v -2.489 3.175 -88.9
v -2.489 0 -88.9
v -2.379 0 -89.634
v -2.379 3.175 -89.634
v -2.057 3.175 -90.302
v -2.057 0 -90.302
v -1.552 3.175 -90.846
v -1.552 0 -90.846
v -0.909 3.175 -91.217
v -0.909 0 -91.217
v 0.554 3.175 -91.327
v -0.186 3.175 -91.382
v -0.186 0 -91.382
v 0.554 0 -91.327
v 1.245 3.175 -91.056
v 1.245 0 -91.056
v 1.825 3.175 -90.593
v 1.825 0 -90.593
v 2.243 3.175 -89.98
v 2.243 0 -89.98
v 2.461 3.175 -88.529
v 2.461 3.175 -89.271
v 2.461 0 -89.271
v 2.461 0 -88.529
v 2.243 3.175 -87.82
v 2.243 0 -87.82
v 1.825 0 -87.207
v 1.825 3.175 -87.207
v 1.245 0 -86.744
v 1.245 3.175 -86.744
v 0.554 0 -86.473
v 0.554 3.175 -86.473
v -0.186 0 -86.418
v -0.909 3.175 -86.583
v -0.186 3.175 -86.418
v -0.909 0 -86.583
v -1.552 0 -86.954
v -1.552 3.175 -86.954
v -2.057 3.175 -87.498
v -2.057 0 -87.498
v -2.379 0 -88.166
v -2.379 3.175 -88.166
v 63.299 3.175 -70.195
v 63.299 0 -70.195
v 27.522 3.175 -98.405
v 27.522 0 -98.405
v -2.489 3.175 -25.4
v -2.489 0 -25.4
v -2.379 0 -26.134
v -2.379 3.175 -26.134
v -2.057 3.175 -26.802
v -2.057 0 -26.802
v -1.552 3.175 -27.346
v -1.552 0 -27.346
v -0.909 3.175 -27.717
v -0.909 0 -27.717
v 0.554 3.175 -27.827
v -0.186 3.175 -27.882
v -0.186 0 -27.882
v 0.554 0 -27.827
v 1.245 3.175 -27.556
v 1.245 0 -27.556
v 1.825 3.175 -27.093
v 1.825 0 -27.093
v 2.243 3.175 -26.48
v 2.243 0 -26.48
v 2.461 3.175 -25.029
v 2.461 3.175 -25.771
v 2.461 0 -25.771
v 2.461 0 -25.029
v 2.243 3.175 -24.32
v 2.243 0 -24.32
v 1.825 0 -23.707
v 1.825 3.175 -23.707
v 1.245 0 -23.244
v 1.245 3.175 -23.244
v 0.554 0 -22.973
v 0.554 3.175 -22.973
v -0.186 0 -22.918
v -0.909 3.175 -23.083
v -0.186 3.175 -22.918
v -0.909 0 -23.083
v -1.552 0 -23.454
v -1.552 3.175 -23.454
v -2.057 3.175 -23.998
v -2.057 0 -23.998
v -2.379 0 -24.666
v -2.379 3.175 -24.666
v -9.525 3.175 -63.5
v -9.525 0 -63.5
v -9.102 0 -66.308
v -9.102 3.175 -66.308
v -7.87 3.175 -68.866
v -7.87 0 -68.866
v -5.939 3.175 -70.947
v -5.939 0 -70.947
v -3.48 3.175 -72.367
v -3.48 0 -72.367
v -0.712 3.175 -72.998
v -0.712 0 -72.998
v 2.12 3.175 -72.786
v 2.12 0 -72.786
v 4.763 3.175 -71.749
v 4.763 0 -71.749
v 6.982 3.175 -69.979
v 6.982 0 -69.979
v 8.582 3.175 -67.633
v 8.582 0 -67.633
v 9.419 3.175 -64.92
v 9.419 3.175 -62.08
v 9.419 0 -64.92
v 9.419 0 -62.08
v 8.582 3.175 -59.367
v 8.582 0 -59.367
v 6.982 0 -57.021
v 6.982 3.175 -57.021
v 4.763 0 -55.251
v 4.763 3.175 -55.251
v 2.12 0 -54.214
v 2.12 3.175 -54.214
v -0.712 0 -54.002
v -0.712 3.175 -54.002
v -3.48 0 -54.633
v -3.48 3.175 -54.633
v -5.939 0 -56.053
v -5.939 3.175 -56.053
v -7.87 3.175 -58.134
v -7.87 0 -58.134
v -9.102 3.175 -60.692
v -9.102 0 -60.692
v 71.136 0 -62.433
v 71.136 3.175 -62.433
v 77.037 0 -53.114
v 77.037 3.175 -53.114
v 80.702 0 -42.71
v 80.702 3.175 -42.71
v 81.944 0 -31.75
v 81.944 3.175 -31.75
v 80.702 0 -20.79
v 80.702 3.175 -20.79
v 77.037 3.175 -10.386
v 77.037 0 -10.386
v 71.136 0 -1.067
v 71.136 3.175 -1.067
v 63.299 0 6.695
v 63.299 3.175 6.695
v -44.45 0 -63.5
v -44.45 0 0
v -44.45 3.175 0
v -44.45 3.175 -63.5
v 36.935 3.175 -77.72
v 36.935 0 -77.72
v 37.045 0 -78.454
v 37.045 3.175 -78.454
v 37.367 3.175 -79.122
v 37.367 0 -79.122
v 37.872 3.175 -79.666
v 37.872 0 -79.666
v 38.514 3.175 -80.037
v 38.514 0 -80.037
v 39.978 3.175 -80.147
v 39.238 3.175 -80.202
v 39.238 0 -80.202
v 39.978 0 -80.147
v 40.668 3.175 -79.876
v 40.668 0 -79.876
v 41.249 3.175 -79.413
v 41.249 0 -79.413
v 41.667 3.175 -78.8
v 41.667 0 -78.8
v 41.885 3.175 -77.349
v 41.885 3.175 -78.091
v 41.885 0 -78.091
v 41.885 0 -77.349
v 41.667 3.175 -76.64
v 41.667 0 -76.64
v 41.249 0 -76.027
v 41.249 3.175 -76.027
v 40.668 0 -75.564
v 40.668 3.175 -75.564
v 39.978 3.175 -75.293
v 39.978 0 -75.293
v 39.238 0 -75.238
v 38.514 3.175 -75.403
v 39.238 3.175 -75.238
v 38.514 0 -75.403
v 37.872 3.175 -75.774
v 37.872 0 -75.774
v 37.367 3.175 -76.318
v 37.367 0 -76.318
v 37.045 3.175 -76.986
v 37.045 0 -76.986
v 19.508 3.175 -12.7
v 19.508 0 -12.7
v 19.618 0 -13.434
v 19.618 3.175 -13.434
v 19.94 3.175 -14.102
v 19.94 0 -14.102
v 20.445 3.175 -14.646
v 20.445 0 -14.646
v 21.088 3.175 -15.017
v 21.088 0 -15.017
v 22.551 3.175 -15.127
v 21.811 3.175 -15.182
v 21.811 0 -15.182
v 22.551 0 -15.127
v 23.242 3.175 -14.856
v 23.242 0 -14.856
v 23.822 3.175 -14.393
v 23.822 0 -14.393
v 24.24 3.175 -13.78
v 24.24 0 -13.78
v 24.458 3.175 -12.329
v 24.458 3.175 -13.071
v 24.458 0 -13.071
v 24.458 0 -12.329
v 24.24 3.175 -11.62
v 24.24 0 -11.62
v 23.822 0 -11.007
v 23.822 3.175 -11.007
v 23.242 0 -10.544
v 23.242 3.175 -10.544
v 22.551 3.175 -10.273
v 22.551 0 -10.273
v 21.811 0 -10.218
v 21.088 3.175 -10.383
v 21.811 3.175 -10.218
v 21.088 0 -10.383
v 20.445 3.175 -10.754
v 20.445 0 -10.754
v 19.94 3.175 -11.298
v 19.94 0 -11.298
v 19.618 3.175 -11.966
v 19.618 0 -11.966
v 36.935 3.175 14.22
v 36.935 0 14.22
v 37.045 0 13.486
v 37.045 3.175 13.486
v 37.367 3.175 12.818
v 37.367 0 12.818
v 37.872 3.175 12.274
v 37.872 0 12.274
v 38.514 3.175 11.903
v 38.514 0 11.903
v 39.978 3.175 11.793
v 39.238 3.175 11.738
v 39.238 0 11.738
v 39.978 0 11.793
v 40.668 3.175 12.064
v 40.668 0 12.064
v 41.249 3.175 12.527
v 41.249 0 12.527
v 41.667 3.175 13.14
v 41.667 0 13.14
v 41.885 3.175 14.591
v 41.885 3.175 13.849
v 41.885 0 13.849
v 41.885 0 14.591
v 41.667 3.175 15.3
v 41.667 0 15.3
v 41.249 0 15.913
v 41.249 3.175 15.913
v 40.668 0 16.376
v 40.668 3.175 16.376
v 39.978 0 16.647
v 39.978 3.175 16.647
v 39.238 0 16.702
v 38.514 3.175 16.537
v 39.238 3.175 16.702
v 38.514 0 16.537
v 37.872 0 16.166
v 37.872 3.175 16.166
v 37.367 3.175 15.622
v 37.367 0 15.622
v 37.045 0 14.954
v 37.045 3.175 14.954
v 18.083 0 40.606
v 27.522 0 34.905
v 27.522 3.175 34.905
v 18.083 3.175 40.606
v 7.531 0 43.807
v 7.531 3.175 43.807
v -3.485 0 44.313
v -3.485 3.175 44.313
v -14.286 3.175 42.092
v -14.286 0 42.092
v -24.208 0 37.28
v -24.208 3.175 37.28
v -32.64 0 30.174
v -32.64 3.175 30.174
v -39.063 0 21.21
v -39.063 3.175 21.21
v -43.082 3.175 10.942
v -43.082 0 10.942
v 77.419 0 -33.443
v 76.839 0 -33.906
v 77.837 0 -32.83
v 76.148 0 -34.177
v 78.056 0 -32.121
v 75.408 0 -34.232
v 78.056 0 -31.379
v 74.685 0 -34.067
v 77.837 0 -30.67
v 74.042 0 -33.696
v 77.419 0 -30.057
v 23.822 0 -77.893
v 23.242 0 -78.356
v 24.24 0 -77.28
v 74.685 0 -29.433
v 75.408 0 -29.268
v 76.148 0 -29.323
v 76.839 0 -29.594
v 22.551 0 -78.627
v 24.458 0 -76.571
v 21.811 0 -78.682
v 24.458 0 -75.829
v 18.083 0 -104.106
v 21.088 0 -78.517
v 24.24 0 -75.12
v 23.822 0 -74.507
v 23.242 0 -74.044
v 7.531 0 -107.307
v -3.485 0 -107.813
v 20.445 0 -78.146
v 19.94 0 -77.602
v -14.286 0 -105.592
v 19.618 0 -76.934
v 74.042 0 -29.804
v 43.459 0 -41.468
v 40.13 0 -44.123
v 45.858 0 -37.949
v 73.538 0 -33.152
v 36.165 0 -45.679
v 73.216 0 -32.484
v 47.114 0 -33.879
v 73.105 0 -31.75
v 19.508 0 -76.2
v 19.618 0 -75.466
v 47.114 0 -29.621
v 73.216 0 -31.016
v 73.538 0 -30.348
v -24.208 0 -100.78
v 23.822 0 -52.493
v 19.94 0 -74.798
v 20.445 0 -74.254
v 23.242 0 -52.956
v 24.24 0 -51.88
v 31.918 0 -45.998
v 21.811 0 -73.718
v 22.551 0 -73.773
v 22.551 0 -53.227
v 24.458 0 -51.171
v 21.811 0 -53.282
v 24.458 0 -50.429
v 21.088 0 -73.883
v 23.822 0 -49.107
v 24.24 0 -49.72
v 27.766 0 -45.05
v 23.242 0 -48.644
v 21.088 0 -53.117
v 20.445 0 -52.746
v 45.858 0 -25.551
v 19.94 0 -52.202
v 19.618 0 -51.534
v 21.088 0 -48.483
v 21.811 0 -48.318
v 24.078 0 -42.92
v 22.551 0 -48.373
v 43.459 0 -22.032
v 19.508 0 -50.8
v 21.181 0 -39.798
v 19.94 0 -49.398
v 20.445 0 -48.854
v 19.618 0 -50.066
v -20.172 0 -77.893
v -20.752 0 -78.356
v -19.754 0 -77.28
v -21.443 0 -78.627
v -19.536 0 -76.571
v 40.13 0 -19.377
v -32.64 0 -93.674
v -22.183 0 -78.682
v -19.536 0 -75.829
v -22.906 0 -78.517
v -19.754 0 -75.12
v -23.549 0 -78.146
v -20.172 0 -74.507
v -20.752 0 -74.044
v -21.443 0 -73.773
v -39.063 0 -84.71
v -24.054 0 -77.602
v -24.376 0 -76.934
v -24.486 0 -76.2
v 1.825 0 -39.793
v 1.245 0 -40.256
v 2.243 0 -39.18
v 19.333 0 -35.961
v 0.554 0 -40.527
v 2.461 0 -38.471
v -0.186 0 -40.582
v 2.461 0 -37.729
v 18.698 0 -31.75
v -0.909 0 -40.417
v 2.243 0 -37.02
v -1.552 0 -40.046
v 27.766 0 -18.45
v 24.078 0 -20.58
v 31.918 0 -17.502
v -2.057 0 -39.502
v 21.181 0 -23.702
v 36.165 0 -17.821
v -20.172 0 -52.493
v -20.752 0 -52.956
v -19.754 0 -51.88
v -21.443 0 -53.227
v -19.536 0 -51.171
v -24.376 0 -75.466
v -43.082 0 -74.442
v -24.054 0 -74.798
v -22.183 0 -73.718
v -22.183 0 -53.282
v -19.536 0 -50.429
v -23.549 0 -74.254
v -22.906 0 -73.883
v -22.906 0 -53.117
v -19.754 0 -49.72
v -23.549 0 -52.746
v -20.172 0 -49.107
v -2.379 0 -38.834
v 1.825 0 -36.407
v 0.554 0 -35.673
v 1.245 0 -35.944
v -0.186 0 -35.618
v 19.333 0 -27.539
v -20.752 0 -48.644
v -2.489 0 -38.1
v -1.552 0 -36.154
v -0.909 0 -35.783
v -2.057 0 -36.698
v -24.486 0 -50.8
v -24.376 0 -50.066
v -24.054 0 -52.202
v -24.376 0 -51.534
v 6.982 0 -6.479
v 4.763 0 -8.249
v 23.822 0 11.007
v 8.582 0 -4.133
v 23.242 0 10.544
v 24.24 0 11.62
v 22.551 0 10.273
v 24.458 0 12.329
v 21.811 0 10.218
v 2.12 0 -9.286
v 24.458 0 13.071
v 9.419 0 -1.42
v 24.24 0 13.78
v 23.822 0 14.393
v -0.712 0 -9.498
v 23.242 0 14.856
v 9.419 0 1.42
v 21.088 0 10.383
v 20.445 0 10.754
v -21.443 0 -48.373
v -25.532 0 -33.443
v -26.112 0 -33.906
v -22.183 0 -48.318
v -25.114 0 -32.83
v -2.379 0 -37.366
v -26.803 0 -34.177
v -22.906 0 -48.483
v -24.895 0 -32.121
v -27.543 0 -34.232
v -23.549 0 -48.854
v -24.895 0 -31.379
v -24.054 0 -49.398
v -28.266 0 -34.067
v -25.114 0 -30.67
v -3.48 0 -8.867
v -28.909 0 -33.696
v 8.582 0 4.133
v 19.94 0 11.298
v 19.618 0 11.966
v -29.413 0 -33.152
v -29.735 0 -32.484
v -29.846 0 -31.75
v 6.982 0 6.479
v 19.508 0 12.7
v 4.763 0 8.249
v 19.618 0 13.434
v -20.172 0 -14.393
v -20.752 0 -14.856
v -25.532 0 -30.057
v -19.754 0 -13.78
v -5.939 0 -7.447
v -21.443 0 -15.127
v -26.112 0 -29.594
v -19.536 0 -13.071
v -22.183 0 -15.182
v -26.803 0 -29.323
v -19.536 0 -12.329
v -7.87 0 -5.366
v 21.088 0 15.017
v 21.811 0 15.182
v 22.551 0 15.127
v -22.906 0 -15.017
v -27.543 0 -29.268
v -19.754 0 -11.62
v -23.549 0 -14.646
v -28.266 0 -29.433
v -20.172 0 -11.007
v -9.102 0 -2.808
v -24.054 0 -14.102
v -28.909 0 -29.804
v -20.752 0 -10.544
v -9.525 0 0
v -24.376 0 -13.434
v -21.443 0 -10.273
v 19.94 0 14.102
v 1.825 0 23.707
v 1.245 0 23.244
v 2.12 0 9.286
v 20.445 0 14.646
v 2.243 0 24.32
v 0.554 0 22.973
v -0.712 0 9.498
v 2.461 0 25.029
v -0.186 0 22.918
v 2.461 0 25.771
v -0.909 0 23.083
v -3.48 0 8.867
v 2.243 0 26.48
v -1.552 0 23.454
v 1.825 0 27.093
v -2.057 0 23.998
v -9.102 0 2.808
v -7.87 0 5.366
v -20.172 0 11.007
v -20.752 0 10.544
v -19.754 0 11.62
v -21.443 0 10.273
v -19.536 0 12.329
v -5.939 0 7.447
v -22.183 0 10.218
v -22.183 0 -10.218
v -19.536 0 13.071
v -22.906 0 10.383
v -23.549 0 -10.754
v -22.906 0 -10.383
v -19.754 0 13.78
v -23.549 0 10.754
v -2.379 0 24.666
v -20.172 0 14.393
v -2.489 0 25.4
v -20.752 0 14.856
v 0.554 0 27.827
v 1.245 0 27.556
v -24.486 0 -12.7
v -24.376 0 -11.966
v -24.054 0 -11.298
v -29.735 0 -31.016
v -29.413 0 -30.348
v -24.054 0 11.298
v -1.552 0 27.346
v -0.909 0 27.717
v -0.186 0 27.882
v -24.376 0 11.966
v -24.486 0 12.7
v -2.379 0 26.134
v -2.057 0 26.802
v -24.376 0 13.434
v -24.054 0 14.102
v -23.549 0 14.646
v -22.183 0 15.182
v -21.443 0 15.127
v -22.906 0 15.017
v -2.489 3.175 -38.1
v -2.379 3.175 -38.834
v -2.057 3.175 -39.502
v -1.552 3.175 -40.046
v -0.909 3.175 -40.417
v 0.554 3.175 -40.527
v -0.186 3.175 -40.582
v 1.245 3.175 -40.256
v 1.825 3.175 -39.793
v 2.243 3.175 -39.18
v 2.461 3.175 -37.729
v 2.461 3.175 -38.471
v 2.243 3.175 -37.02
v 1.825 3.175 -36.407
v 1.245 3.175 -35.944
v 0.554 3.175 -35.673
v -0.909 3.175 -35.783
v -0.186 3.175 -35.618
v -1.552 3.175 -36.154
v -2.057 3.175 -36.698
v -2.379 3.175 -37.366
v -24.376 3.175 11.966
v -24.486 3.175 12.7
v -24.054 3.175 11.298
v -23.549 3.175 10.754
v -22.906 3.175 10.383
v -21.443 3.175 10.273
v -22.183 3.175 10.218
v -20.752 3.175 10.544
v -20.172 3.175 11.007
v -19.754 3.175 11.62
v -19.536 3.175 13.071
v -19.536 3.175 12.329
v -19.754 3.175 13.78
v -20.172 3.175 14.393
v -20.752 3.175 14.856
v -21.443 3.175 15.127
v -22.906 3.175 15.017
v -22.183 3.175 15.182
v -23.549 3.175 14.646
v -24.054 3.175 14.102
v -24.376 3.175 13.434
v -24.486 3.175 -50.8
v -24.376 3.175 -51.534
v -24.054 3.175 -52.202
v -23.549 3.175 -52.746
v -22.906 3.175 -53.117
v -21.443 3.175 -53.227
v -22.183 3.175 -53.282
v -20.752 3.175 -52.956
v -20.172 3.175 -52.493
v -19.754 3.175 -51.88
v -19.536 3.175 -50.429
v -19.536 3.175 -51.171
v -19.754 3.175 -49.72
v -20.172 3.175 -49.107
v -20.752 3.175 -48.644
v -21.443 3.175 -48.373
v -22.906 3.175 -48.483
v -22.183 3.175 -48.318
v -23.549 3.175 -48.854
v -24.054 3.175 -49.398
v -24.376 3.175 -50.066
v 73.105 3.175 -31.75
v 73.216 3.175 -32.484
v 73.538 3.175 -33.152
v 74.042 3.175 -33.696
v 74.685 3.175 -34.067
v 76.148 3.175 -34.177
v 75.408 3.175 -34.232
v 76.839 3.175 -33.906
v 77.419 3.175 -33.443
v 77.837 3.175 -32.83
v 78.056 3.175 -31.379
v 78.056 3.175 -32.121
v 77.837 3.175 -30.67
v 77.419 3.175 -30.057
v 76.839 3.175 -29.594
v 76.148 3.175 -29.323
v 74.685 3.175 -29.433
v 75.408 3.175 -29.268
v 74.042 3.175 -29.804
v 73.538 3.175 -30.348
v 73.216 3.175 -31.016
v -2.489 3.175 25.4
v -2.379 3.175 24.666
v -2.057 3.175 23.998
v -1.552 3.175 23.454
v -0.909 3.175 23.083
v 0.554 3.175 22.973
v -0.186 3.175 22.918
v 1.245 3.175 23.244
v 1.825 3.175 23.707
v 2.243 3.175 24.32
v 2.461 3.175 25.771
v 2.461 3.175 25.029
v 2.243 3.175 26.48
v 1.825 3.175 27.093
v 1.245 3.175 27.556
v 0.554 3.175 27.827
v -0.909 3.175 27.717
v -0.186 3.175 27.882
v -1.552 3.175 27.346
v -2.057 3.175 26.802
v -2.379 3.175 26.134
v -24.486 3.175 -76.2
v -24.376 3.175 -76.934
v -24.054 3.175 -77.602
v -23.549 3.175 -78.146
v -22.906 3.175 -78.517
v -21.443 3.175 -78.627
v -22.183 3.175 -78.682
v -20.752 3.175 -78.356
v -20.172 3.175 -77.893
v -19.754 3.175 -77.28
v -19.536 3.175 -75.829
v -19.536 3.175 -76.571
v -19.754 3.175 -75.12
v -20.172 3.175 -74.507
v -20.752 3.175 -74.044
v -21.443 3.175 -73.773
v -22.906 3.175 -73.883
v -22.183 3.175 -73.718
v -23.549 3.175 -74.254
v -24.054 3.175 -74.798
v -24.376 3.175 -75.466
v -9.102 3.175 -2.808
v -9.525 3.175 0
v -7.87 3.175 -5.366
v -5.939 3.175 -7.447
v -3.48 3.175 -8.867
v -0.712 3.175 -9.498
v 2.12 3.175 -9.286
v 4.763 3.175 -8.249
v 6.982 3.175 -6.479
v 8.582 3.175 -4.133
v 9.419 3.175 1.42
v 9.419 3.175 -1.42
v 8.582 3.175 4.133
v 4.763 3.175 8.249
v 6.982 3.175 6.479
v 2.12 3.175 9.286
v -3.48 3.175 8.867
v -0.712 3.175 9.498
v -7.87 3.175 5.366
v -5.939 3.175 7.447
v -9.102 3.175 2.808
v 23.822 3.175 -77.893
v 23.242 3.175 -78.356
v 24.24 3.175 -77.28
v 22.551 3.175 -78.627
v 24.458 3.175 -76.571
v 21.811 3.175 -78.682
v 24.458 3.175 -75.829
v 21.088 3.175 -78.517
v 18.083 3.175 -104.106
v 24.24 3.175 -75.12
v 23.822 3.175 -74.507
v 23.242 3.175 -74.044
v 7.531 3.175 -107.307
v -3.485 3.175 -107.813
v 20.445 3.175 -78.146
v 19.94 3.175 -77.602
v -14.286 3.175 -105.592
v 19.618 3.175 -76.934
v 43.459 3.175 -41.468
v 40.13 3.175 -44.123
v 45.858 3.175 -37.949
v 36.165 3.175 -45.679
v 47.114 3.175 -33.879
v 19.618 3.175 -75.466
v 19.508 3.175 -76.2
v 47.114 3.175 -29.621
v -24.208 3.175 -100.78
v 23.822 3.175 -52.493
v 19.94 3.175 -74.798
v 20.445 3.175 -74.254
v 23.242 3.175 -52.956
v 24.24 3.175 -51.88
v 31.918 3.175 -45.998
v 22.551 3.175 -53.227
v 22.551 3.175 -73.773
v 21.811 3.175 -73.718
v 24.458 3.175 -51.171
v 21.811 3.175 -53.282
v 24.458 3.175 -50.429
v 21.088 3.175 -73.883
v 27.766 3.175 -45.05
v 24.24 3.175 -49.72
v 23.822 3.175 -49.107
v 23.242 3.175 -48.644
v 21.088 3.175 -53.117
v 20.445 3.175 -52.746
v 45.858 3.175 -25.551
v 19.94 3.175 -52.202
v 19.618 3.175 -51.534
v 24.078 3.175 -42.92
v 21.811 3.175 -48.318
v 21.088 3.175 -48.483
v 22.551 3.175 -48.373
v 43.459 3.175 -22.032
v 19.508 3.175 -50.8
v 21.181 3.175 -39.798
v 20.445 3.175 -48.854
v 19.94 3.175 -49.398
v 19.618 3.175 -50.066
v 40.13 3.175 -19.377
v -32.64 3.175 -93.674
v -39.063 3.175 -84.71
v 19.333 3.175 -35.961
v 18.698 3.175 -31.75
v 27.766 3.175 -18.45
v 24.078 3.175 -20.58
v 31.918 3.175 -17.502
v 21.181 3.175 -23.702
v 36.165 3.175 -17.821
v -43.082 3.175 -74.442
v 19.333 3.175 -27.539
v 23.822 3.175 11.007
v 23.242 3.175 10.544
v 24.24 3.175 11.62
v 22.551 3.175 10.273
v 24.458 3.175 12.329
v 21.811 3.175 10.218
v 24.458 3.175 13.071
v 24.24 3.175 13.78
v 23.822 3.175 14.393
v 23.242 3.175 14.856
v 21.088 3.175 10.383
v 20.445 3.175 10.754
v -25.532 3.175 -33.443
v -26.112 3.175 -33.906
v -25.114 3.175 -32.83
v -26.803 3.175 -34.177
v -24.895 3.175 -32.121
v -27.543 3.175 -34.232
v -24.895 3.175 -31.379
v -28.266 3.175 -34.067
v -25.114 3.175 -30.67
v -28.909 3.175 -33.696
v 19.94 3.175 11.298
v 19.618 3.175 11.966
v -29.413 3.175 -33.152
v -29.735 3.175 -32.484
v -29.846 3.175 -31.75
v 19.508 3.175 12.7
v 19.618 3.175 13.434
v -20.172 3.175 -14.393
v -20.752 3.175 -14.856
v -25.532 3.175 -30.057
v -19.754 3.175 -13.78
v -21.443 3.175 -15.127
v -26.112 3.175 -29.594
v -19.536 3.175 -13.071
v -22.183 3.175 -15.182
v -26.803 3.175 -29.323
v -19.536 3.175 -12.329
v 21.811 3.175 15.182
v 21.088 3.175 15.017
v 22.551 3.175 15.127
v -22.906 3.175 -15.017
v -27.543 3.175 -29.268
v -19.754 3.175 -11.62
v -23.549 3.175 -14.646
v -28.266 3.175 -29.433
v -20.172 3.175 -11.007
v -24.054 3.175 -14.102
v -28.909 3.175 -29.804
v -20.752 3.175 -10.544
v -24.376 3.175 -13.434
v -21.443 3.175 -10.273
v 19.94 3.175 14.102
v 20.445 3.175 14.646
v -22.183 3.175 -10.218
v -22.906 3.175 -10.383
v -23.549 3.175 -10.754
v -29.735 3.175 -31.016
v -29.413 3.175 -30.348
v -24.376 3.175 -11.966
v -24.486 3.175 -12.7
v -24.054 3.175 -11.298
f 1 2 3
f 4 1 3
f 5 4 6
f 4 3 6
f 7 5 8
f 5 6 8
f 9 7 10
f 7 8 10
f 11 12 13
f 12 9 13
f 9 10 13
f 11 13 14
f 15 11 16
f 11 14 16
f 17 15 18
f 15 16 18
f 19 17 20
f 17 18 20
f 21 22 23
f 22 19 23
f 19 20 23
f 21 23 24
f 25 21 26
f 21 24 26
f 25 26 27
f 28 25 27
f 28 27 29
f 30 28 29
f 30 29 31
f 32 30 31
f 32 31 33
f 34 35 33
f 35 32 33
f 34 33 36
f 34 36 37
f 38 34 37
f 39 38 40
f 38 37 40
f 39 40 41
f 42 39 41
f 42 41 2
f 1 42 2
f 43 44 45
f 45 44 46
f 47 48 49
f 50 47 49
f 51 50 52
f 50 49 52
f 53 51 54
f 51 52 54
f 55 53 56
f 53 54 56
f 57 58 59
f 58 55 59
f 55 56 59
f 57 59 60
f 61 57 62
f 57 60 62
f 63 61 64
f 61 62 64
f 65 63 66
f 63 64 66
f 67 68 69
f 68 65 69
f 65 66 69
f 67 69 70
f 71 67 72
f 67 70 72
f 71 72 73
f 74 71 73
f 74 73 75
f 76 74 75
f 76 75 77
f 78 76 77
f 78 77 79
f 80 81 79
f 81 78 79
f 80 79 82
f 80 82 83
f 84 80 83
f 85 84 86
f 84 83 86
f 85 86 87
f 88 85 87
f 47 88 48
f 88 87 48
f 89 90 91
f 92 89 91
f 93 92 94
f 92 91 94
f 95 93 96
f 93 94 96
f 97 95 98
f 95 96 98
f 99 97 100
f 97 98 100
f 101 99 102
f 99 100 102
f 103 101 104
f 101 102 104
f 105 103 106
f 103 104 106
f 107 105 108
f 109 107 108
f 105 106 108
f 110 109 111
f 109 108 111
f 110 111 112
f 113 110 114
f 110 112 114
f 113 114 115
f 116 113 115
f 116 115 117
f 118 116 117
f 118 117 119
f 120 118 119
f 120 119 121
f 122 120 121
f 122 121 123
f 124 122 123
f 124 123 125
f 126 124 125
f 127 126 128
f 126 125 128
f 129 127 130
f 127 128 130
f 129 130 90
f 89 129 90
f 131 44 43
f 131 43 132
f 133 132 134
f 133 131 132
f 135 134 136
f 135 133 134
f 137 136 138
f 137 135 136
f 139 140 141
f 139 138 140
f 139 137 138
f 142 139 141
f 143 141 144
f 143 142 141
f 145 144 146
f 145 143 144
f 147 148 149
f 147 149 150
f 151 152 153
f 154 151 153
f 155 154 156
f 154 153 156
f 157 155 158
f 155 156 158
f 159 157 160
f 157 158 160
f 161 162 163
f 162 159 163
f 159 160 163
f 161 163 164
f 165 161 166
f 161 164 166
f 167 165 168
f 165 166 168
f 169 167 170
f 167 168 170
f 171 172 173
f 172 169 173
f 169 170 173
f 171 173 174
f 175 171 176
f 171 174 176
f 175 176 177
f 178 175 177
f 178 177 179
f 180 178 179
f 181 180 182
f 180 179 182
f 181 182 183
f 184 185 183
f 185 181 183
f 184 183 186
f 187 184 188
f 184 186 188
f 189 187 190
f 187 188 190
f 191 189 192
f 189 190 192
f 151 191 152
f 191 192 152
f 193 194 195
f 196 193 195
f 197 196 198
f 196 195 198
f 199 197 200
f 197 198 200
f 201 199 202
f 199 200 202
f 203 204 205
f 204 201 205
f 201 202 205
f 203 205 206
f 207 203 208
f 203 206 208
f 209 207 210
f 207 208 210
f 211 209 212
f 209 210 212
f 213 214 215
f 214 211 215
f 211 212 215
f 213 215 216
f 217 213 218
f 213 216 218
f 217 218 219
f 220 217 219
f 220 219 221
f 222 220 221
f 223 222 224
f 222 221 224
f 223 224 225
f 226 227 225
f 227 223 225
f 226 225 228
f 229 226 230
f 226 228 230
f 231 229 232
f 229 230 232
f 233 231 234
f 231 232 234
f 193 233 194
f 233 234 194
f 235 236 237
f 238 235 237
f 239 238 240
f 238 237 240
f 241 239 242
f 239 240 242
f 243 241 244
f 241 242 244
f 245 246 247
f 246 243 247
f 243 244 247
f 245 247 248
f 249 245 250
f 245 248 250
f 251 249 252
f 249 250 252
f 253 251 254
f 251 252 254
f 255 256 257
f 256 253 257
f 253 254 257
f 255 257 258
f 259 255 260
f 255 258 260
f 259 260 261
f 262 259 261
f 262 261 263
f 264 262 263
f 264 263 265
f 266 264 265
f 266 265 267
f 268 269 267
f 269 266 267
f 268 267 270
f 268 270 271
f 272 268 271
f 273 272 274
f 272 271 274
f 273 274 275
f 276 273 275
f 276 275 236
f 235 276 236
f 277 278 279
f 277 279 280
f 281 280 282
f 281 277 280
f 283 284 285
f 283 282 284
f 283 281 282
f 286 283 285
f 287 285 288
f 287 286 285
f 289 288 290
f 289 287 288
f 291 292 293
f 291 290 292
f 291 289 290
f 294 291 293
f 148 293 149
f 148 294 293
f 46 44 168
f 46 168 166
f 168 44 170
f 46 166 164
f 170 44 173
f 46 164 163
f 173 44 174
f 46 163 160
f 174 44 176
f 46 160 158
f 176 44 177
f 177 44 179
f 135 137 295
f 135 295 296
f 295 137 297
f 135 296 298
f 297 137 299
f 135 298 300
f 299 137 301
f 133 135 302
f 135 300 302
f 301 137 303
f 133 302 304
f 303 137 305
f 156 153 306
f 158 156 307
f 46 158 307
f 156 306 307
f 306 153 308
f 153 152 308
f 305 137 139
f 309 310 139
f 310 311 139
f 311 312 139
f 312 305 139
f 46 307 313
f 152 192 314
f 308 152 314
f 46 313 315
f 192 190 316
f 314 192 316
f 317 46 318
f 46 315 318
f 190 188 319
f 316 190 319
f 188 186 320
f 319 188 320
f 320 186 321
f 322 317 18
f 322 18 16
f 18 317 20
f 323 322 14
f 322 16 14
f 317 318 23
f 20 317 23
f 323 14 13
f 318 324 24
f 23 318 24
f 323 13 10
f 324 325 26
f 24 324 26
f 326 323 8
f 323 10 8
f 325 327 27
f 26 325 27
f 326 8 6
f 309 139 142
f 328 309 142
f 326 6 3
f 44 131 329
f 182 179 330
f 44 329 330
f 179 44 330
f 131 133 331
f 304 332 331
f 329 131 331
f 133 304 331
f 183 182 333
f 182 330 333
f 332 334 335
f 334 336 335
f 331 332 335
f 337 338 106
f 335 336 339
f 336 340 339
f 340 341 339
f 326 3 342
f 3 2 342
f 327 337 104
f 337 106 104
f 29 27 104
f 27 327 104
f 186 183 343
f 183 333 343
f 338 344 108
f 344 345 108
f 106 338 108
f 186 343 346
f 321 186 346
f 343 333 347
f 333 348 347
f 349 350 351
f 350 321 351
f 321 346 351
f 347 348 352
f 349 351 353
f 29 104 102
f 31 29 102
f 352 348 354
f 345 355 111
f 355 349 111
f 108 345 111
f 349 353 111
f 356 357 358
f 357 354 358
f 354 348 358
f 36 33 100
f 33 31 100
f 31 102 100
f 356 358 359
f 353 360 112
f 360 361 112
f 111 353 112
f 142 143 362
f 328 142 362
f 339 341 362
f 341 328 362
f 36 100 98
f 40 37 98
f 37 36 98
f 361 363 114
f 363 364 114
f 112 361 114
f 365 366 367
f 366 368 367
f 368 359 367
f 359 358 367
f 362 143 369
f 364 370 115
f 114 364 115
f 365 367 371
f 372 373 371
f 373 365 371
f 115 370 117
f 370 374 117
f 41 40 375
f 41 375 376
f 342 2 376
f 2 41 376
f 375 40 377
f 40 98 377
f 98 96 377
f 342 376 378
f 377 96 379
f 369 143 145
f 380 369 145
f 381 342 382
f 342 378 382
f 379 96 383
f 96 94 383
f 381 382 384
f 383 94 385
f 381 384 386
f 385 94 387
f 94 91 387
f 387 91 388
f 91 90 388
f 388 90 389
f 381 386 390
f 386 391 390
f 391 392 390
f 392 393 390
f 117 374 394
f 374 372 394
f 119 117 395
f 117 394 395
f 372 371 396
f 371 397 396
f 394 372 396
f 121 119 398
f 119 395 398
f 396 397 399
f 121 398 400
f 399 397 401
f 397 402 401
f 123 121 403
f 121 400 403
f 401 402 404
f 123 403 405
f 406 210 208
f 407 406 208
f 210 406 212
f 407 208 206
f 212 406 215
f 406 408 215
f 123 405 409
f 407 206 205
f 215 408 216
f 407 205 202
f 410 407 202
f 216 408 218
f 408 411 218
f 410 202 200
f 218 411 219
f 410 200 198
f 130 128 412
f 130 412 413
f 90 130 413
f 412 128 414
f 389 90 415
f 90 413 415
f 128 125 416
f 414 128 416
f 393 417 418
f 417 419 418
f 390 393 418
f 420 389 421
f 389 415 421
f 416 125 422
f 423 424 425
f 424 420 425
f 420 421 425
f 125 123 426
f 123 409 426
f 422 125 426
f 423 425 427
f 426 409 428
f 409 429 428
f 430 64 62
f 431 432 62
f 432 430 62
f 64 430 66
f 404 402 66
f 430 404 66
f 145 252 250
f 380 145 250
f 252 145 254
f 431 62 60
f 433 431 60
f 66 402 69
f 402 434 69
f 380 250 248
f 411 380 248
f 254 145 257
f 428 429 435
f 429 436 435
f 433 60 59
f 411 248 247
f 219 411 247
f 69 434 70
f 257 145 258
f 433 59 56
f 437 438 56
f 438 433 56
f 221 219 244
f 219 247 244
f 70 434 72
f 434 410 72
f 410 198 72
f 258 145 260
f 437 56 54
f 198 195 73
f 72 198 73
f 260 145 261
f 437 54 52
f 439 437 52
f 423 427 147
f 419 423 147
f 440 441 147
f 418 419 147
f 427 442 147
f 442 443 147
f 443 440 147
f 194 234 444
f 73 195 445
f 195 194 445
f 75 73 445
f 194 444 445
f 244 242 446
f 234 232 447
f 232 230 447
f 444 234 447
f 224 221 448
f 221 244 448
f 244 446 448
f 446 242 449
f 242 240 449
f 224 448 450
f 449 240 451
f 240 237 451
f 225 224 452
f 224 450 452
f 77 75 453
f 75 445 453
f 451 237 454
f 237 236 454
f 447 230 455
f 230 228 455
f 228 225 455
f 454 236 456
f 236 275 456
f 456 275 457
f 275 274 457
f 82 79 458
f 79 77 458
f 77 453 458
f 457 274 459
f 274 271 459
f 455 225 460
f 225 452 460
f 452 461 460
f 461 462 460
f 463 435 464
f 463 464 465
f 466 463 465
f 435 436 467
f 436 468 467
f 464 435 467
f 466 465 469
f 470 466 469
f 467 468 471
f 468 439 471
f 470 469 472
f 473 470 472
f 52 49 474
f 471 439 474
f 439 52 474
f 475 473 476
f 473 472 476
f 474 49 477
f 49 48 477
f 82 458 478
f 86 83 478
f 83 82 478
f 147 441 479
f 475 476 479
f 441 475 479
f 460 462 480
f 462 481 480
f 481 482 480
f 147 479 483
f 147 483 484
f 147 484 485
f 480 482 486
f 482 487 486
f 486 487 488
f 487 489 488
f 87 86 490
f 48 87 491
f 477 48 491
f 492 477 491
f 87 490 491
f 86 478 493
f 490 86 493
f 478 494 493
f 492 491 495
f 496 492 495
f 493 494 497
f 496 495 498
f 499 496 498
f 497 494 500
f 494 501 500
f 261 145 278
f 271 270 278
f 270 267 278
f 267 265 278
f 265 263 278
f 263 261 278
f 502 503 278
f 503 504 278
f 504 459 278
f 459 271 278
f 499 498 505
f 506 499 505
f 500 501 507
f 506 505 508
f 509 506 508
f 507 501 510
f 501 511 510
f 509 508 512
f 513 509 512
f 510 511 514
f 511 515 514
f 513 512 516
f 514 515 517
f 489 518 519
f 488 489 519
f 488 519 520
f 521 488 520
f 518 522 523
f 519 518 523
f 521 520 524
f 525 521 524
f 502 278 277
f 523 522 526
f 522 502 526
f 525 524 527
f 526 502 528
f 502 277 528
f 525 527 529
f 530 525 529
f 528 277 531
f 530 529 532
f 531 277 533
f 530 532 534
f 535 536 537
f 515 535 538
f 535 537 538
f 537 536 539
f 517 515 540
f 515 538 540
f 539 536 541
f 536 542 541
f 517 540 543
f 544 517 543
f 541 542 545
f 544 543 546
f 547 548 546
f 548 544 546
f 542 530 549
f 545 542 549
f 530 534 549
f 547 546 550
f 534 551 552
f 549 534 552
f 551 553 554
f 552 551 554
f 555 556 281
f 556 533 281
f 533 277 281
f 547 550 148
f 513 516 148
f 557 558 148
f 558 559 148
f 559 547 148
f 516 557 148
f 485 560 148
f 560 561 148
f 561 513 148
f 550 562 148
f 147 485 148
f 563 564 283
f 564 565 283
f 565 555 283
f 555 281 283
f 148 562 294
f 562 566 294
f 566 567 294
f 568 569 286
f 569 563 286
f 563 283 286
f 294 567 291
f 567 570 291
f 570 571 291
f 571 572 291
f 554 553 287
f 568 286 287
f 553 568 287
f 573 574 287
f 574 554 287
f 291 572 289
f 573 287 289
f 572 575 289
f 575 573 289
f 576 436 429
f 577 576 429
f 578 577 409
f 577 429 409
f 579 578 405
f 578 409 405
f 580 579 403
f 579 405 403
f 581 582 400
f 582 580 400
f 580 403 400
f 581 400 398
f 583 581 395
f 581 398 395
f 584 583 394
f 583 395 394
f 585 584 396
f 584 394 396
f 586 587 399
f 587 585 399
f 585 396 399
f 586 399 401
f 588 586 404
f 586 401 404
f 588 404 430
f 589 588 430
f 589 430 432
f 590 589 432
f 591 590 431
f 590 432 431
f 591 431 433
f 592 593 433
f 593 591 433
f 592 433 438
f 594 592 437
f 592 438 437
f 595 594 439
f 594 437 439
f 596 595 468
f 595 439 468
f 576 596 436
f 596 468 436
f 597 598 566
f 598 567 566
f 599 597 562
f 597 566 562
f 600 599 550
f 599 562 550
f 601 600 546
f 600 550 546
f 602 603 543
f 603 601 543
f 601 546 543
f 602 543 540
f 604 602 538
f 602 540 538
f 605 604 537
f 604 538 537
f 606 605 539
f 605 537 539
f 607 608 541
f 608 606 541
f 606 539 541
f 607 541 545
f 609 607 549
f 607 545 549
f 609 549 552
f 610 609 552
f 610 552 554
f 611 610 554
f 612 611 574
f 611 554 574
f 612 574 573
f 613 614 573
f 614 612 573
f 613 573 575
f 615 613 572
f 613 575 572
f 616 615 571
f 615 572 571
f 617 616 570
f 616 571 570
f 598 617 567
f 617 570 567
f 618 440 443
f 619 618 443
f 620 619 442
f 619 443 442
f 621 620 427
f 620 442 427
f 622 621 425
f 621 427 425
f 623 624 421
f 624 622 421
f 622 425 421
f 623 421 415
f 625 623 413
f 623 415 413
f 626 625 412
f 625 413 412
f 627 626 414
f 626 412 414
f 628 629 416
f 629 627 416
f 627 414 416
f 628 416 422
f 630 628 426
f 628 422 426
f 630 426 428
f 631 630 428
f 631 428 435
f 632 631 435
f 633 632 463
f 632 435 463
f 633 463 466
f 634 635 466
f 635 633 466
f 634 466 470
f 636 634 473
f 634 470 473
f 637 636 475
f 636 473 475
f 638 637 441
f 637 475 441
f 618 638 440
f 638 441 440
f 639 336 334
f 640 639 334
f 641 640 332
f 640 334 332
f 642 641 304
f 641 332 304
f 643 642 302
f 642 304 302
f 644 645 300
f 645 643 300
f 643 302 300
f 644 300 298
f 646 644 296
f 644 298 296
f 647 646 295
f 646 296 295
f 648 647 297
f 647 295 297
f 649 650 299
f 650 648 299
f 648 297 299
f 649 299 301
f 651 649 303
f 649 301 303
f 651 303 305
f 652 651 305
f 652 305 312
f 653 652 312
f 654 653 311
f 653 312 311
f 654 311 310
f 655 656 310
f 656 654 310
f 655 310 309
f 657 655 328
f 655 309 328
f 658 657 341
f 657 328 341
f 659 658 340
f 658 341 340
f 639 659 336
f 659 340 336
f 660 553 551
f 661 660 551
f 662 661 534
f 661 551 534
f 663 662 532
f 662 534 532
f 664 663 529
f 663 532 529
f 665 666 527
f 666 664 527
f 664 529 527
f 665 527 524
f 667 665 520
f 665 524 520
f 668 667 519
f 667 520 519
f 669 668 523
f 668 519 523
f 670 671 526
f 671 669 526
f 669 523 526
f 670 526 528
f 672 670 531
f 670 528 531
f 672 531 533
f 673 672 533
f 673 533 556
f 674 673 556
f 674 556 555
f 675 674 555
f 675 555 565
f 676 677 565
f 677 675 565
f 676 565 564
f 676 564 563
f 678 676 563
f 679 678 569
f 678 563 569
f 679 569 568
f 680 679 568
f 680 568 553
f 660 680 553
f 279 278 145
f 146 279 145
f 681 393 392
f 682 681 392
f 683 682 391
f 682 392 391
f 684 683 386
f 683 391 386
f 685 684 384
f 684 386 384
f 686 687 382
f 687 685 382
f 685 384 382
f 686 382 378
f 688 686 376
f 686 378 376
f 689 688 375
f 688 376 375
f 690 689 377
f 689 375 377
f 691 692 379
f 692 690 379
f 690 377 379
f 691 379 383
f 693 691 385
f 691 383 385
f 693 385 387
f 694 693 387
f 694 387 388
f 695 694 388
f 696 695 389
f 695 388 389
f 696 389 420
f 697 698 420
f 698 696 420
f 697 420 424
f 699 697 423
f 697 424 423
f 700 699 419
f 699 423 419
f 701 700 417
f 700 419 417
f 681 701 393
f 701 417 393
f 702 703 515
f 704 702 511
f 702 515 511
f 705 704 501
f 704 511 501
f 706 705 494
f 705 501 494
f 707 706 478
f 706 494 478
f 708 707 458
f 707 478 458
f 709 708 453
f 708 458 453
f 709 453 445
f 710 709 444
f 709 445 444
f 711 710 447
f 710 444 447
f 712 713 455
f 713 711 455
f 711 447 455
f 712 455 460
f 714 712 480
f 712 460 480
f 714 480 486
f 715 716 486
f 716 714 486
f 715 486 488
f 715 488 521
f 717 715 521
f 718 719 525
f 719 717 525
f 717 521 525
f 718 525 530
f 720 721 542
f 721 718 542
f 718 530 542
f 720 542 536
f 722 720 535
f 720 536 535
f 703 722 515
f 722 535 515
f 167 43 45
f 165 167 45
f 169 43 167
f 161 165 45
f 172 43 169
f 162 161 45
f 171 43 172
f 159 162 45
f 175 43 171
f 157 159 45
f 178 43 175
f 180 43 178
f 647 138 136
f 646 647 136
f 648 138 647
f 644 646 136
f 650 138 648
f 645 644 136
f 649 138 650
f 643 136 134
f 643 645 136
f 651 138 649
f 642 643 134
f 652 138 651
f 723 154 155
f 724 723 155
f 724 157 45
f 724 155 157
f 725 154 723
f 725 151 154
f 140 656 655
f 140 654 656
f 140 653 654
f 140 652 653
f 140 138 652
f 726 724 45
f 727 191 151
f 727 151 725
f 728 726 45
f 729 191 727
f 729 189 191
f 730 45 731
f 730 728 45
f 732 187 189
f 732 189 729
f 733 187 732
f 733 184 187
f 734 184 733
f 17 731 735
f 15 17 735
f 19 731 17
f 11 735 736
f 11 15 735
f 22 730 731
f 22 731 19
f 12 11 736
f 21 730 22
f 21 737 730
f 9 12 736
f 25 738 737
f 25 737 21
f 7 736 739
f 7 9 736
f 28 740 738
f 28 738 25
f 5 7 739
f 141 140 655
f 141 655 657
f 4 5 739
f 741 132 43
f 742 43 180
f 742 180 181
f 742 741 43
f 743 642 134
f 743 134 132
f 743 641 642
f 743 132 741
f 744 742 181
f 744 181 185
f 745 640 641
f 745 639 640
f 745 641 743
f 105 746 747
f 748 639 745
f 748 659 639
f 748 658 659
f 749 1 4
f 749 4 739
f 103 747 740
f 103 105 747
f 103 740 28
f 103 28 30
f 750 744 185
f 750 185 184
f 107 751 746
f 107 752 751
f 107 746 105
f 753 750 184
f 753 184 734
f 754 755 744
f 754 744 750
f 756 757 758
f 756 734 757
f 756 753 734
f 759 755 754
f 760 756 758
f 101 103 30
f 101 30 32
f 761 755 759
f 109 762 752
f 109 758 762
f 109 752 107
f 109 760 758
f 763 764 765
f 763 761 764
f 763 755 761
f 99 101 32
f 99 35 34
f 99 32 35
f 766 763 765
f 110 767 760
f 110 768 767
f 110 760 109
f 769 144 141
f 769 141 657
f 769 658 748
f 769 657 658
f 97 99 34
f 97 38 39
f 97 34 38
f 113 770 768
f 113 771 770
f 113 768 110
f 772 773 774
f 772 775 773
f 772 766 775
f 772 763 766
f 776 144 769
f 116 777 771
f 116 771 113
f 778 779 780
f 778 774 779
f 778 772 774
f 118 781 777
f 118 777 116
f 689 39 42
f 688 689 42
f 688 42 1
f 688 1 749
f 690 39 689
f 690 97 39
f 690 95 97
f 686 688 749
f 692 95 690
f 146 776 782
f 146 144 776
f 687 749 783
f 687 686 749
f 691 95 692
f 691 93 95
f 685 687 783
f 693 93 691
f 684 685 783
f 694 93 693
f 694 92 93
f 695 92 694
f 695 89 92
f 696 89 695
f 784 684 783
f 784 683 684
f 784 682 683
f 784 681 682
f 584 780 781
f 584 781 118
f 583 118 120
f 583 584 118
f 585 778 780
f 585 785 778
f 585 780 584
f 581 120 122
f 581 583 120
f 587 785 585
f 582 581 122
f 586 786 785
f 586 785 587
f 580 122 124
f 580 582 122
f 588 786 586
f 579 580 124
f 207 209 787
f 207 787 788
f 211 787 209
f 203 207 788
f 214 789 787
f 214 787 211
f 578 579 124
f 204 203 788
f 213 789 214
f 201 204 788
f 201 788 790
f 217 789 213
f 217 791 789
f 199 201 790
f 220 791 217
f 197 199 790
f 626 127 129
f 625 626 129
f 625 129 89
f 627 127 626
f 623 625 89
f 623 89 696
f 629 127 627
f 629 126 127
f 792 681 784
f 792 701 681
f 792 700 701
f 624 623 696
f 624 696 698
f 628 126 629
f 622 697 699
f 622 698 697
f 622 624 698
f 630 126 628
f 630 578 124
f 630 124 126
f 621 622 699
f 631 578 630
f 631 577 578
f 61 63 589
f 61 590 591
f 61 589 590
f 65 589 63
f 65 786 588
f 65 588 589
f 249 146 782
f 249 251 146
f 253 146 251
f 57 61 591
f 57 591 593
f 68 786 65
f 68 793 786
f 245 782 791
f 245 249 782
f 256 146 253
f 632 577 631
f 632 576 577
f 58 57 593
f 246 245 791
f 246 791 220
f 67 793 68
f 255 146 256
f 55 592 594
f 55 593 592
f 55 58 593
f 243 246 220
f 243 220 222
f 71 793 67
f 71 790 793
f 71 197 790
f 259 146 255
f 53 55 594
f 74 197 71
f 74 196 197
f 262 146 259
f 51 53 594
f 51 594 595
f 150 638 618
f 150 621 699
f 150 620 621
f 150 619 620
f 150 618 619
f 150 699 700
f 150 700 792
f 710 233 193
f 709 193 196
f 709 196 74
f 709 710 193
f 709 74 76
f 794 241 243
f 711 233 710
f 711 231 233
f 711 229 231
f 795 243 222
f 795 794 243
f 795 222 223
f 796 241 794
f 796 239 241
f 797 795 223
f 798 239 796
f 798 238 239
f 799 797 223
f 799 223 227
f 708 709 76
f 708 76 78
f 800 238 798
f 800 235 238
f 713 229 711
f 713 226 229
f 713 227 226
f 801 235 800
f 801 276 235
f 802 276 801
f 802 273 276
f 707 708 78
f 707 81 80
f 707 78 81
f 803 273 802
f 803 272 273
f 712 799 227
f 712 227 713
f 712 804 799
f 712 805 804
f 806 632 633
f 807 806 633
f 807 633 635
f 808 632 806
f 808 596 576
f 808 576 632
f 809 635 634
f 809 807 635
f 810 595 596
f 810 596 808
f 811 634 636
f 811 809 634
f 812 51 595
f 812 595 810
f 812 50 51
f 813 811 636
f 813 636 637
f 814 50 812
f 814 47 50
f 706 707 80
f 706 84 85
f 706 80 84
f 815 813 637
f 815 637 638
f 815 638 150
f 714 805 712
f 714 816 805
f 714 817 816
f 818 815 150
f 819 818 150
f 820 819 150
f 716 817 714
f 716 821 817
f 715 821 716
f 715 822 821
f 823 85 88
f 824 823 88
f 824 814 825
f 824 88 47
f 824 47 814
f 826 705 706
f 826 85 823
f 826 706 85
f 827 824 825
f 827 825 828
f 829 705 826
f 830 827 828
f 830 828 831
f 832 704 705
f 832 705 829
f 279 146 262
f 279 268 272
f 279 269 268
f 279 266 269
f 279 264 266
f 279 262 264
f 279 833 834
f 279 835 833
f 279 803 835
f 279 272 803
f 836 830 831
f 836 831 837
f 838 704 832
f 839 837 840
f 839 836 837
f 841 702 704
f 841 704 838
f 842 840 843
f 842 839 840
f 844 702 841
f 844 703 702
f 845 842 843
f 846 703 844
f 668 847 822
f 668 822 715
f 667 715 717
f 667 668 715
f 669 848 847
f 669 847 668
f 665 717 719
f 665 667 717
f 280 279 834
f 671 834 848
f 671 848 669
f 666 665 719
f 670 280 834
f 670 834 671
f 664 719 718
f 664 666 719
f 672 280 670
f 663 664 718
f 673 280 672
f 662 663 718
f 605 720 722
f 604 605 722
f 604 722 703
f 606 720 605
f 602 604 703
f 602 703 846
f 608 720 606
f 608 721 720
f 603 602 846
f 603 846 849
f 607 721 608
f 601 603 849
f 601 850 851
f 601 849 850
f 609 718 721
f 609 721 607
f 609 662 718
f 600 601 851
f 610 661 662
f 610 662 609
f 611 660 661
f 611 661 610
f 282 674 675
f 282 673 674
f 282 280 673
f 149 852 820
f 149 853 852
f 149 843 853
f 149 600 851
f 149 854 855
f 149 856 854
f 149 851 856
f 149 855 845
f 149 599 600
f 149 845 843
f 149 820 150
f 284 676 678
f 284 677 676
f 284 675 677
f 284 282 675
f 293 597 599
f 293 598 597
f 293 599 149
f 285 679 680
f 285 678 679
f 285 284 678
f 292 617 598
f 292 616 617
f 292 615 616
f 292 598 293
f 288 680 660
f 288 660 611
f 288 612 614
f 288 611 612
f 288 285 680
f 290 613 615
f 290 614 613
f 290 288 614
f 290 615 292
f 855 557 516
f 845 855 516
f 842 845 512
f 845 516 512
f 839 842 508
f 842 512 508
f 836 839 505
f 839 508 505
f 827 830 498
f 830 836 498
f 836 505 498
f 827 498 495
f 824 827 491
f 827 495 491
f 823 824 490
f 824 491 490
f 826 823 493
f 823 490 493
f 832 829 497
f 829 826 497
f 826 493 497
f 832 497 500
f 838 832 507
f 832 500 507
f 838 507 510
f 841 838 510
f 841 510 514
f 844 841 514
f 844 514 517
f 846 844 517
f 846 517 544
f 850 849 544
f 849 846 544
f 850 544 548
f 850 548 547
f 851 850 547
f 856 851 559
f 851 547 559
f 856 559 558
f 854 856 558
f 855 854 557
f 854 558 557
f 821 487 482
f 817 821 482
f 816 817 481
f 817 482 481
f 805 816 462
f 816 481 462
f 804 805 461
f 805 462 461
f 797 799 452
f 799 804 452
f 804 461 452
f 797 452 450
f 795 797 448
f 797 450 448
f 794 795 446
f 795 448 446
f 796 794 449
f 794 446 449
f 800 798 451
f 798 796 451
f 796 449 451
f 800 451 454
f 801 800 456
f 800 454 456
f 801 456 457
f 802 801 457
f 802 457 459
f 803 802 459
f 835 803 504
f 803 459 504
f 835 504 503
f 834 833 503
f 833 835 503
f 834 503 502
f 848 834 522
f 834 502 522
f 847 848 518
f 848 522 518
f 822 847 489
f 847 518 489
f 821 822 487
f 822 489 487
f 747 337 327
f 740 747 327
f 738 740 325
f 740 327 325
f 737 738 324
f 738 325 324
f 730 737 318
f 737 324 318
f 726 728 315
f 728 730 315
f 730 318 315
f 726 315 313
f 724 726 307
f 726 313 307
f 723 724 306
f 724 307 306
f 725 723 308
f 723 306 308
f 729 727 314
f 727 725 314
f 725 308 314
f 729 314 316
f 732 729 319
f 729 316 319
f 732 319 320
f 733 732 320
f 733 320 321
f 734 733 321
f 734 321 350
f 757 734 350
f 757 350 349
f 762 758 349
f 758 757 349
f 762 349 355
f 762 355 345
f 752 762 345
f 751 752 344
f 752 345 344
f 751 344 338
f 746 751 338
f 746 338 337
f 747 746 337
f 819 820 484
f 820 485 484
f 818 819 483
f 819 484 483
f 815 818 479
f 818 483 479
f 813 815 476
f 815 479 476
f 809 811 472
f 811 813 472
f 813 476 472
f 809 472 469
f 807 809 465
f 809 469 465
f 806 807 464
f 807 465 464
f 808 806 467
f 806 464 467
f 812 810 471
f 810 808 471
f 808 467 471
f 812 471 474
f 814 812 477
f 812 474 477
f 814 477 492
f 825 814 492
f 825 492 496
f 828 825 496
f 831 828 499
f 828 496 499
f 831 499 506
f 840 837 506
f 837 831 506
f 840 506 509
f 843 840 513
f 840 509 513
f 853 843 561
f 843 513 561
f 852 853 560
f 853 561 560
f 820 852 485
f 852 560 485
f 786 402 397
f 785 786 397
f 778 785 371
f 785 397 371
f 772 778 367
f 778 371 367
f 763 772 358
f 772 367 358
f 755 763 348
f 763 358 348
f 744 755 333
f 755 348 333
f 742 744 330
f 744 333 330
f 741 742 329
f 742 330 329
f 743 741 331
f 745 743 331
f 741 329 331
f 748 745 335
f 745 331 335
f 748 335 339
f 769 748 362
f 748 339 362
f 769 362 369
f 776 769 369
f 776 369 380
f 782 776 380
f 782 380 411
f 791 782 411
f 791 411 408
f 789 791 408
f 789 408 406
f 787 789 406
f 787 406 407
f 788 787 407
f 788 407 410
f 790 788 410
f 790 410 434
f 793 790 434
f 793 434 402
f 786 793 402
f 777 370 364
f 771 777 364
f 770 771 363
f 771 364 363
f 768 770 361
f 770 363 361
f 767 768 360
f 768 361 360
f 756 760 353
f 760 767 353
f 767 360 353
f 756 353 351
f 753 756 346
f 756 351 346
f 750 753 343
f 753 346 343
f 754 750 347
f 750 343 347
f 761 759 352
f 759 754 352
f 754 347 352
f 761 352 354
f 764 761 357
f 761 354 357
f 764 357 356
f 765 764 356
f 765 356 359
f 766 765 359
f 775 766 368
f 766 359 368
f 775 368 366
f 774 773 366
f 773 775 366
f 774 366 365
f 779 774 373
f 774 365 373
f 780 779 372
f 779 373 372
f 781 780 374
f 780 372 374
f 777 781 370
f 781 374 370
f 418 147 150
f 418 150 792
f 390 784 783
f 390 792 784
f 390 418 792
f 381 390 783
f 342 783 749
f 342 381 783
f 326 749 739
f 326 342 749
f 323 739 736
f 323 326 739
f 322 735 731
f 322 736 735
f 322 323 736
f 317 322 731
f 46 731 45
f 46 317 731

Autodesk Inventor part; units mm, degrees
ref_plane "YZ Plane" through (0, 0, 0) normal (1, 0, 0) x (0, 1, 0)
ref_plane "XZ Plane" through (0, 0, 0) normal (0, 1, 0) x (-1, 0, 0)
ref_plane "XY Plane" through (0, 0, 0) normal (0, 0, 1) x (1, 0, 0)
sketch "Sketch1" plane through (0, 0, 0) normal (0, 1, 0) x (-1, 0, 0)
  circle A0 centre (0, 0) radius 31.75 construction
  circle A1 centre (0, -63.5) radius 31.75 construction
  circle A2 centre (0, 0) radius 9.525
  circle A3 centre (0, -63.5) radius 9.525
  circle A4 centre (0, 0) radius 25.4 construction
  circle A5 centre (0, -63.5) radius 25.4 construction
  circle A6 centre (0, 25.4) radius 2.4892
  circle A7 centre (-21.997, 12.7) radius 2.4892
  circle A8 centre (-21.997, -12.7) radius 2.4892
  circle A9 centre (0, -25.4) radius 2.4892
  circle A10 centre (21.997, -12.7) radius 2.4892
  circle A11 centre (21.997, 12.7) radius 2.4892
  circle A12 centre (0, -88.9) radius 2.4892
  circle A13 centre (21.997, -76.2) radius 2.4892
  circle A14 centre (21.997, -50.8) radius 2.4892
  circle A15 centre (0, -38.1) radius 2.4892
  circle A16 centre (-21.997, -50.8) radius 2.4892
  circle A17 centre (-21.997, -76.2) radius 2.4892
  circle A18 centre (-32.9859, -31.75) radius 36.2585 construction
  circle A19 centre (-32.9859, -31.75) radius 14.2875
  circle A20 centre (0, -63.5) radius 44.45
  circle A21 centre (0, 0) radius 44.45
  circle A22 centre (-32.9859, -31.75) radius 48.9585
  circle A23 centre (-39.4239, 14.2199) radius 2.4892
  circle A24 centre (-39.4239, 14.2199) radius 6.35 construction
  line L0 (-29.8666, 10.7726) -> (-33.4506, 12.0653) construction
  line L1 (-38.5432, 7.9312) -> (-38.0147, 4.1581) construction
  circle A25 centre (-39.4239, -77.7199) radius 2.4892
  circle A26 centre (-39.4239, -77.7199) radius 6.35 construction
  line L2 (-33.4506, -75.5653) -> (-29.8666, -74.2726) construction
  line L3 (-38.5432, -71.4312) -> (-38.0147, -67.6581) construction
  circle A27 centre (27.3566, -31.75) radius 2.4892
  circle A28 centre (27.3566, -31.75) radius 6.35 construction
  line L4 (23.2117, -26.9394) -> (20.7247, -24.053) construction
  line L5 (23.2117, -36.5606) -> (20.7247, -39.447) construction
  line L6 (44.45, 0) -> (44.45, -63.5)
  line L7 (-27.5218, 34.9049) -> (-63.2991, 6.6953)
  line L8 (-63.2991, -70.1953) -> (-27.5218, -98.4049)
  circle A29 centre (-75.5944, -31.75) radius 6.35 construction
  circle A30 centre (-75.5944, -31.75) radius 2.4892
  point P0 (31.1085, -31.75)
  dimension "d4" = 50.8
  dimension "d0" = 63.5
  dimension "d2" = 19.05
  dimension "d5" = 4.9784
  dimension "d8" = 360
  dimension "d12" = 360
  dimension "d14" = 72.517
  dimension "d15" = 28.575
  dimension "d38" = 45.7835
  dimension "d39" = 12.7
  dimension "d40" = 12.7
  dimension "d41" = 12.7
  dimension "d42" = 4.9784
  dimension "d43" = 12.7
  dimension "d44" = 3.81
extrude "Extrusion2" add sketch "Sketch1" along normal blind 3.175 contours A2 A22 A21 A20 | A2 A22 A20 A19 A21 | A22 L7 A21 | A21 A19 A20 A22 | A22 A21 A19 A20 | A20 A21 A22 | A21 L6 A20 | A20 A22 A3 A21 | A19 A21 A22 A3 A20 | A22 A20 L8
properties part number "Gearboxes_3_thingy that holds motors and more" material "Aluminum 6061"
